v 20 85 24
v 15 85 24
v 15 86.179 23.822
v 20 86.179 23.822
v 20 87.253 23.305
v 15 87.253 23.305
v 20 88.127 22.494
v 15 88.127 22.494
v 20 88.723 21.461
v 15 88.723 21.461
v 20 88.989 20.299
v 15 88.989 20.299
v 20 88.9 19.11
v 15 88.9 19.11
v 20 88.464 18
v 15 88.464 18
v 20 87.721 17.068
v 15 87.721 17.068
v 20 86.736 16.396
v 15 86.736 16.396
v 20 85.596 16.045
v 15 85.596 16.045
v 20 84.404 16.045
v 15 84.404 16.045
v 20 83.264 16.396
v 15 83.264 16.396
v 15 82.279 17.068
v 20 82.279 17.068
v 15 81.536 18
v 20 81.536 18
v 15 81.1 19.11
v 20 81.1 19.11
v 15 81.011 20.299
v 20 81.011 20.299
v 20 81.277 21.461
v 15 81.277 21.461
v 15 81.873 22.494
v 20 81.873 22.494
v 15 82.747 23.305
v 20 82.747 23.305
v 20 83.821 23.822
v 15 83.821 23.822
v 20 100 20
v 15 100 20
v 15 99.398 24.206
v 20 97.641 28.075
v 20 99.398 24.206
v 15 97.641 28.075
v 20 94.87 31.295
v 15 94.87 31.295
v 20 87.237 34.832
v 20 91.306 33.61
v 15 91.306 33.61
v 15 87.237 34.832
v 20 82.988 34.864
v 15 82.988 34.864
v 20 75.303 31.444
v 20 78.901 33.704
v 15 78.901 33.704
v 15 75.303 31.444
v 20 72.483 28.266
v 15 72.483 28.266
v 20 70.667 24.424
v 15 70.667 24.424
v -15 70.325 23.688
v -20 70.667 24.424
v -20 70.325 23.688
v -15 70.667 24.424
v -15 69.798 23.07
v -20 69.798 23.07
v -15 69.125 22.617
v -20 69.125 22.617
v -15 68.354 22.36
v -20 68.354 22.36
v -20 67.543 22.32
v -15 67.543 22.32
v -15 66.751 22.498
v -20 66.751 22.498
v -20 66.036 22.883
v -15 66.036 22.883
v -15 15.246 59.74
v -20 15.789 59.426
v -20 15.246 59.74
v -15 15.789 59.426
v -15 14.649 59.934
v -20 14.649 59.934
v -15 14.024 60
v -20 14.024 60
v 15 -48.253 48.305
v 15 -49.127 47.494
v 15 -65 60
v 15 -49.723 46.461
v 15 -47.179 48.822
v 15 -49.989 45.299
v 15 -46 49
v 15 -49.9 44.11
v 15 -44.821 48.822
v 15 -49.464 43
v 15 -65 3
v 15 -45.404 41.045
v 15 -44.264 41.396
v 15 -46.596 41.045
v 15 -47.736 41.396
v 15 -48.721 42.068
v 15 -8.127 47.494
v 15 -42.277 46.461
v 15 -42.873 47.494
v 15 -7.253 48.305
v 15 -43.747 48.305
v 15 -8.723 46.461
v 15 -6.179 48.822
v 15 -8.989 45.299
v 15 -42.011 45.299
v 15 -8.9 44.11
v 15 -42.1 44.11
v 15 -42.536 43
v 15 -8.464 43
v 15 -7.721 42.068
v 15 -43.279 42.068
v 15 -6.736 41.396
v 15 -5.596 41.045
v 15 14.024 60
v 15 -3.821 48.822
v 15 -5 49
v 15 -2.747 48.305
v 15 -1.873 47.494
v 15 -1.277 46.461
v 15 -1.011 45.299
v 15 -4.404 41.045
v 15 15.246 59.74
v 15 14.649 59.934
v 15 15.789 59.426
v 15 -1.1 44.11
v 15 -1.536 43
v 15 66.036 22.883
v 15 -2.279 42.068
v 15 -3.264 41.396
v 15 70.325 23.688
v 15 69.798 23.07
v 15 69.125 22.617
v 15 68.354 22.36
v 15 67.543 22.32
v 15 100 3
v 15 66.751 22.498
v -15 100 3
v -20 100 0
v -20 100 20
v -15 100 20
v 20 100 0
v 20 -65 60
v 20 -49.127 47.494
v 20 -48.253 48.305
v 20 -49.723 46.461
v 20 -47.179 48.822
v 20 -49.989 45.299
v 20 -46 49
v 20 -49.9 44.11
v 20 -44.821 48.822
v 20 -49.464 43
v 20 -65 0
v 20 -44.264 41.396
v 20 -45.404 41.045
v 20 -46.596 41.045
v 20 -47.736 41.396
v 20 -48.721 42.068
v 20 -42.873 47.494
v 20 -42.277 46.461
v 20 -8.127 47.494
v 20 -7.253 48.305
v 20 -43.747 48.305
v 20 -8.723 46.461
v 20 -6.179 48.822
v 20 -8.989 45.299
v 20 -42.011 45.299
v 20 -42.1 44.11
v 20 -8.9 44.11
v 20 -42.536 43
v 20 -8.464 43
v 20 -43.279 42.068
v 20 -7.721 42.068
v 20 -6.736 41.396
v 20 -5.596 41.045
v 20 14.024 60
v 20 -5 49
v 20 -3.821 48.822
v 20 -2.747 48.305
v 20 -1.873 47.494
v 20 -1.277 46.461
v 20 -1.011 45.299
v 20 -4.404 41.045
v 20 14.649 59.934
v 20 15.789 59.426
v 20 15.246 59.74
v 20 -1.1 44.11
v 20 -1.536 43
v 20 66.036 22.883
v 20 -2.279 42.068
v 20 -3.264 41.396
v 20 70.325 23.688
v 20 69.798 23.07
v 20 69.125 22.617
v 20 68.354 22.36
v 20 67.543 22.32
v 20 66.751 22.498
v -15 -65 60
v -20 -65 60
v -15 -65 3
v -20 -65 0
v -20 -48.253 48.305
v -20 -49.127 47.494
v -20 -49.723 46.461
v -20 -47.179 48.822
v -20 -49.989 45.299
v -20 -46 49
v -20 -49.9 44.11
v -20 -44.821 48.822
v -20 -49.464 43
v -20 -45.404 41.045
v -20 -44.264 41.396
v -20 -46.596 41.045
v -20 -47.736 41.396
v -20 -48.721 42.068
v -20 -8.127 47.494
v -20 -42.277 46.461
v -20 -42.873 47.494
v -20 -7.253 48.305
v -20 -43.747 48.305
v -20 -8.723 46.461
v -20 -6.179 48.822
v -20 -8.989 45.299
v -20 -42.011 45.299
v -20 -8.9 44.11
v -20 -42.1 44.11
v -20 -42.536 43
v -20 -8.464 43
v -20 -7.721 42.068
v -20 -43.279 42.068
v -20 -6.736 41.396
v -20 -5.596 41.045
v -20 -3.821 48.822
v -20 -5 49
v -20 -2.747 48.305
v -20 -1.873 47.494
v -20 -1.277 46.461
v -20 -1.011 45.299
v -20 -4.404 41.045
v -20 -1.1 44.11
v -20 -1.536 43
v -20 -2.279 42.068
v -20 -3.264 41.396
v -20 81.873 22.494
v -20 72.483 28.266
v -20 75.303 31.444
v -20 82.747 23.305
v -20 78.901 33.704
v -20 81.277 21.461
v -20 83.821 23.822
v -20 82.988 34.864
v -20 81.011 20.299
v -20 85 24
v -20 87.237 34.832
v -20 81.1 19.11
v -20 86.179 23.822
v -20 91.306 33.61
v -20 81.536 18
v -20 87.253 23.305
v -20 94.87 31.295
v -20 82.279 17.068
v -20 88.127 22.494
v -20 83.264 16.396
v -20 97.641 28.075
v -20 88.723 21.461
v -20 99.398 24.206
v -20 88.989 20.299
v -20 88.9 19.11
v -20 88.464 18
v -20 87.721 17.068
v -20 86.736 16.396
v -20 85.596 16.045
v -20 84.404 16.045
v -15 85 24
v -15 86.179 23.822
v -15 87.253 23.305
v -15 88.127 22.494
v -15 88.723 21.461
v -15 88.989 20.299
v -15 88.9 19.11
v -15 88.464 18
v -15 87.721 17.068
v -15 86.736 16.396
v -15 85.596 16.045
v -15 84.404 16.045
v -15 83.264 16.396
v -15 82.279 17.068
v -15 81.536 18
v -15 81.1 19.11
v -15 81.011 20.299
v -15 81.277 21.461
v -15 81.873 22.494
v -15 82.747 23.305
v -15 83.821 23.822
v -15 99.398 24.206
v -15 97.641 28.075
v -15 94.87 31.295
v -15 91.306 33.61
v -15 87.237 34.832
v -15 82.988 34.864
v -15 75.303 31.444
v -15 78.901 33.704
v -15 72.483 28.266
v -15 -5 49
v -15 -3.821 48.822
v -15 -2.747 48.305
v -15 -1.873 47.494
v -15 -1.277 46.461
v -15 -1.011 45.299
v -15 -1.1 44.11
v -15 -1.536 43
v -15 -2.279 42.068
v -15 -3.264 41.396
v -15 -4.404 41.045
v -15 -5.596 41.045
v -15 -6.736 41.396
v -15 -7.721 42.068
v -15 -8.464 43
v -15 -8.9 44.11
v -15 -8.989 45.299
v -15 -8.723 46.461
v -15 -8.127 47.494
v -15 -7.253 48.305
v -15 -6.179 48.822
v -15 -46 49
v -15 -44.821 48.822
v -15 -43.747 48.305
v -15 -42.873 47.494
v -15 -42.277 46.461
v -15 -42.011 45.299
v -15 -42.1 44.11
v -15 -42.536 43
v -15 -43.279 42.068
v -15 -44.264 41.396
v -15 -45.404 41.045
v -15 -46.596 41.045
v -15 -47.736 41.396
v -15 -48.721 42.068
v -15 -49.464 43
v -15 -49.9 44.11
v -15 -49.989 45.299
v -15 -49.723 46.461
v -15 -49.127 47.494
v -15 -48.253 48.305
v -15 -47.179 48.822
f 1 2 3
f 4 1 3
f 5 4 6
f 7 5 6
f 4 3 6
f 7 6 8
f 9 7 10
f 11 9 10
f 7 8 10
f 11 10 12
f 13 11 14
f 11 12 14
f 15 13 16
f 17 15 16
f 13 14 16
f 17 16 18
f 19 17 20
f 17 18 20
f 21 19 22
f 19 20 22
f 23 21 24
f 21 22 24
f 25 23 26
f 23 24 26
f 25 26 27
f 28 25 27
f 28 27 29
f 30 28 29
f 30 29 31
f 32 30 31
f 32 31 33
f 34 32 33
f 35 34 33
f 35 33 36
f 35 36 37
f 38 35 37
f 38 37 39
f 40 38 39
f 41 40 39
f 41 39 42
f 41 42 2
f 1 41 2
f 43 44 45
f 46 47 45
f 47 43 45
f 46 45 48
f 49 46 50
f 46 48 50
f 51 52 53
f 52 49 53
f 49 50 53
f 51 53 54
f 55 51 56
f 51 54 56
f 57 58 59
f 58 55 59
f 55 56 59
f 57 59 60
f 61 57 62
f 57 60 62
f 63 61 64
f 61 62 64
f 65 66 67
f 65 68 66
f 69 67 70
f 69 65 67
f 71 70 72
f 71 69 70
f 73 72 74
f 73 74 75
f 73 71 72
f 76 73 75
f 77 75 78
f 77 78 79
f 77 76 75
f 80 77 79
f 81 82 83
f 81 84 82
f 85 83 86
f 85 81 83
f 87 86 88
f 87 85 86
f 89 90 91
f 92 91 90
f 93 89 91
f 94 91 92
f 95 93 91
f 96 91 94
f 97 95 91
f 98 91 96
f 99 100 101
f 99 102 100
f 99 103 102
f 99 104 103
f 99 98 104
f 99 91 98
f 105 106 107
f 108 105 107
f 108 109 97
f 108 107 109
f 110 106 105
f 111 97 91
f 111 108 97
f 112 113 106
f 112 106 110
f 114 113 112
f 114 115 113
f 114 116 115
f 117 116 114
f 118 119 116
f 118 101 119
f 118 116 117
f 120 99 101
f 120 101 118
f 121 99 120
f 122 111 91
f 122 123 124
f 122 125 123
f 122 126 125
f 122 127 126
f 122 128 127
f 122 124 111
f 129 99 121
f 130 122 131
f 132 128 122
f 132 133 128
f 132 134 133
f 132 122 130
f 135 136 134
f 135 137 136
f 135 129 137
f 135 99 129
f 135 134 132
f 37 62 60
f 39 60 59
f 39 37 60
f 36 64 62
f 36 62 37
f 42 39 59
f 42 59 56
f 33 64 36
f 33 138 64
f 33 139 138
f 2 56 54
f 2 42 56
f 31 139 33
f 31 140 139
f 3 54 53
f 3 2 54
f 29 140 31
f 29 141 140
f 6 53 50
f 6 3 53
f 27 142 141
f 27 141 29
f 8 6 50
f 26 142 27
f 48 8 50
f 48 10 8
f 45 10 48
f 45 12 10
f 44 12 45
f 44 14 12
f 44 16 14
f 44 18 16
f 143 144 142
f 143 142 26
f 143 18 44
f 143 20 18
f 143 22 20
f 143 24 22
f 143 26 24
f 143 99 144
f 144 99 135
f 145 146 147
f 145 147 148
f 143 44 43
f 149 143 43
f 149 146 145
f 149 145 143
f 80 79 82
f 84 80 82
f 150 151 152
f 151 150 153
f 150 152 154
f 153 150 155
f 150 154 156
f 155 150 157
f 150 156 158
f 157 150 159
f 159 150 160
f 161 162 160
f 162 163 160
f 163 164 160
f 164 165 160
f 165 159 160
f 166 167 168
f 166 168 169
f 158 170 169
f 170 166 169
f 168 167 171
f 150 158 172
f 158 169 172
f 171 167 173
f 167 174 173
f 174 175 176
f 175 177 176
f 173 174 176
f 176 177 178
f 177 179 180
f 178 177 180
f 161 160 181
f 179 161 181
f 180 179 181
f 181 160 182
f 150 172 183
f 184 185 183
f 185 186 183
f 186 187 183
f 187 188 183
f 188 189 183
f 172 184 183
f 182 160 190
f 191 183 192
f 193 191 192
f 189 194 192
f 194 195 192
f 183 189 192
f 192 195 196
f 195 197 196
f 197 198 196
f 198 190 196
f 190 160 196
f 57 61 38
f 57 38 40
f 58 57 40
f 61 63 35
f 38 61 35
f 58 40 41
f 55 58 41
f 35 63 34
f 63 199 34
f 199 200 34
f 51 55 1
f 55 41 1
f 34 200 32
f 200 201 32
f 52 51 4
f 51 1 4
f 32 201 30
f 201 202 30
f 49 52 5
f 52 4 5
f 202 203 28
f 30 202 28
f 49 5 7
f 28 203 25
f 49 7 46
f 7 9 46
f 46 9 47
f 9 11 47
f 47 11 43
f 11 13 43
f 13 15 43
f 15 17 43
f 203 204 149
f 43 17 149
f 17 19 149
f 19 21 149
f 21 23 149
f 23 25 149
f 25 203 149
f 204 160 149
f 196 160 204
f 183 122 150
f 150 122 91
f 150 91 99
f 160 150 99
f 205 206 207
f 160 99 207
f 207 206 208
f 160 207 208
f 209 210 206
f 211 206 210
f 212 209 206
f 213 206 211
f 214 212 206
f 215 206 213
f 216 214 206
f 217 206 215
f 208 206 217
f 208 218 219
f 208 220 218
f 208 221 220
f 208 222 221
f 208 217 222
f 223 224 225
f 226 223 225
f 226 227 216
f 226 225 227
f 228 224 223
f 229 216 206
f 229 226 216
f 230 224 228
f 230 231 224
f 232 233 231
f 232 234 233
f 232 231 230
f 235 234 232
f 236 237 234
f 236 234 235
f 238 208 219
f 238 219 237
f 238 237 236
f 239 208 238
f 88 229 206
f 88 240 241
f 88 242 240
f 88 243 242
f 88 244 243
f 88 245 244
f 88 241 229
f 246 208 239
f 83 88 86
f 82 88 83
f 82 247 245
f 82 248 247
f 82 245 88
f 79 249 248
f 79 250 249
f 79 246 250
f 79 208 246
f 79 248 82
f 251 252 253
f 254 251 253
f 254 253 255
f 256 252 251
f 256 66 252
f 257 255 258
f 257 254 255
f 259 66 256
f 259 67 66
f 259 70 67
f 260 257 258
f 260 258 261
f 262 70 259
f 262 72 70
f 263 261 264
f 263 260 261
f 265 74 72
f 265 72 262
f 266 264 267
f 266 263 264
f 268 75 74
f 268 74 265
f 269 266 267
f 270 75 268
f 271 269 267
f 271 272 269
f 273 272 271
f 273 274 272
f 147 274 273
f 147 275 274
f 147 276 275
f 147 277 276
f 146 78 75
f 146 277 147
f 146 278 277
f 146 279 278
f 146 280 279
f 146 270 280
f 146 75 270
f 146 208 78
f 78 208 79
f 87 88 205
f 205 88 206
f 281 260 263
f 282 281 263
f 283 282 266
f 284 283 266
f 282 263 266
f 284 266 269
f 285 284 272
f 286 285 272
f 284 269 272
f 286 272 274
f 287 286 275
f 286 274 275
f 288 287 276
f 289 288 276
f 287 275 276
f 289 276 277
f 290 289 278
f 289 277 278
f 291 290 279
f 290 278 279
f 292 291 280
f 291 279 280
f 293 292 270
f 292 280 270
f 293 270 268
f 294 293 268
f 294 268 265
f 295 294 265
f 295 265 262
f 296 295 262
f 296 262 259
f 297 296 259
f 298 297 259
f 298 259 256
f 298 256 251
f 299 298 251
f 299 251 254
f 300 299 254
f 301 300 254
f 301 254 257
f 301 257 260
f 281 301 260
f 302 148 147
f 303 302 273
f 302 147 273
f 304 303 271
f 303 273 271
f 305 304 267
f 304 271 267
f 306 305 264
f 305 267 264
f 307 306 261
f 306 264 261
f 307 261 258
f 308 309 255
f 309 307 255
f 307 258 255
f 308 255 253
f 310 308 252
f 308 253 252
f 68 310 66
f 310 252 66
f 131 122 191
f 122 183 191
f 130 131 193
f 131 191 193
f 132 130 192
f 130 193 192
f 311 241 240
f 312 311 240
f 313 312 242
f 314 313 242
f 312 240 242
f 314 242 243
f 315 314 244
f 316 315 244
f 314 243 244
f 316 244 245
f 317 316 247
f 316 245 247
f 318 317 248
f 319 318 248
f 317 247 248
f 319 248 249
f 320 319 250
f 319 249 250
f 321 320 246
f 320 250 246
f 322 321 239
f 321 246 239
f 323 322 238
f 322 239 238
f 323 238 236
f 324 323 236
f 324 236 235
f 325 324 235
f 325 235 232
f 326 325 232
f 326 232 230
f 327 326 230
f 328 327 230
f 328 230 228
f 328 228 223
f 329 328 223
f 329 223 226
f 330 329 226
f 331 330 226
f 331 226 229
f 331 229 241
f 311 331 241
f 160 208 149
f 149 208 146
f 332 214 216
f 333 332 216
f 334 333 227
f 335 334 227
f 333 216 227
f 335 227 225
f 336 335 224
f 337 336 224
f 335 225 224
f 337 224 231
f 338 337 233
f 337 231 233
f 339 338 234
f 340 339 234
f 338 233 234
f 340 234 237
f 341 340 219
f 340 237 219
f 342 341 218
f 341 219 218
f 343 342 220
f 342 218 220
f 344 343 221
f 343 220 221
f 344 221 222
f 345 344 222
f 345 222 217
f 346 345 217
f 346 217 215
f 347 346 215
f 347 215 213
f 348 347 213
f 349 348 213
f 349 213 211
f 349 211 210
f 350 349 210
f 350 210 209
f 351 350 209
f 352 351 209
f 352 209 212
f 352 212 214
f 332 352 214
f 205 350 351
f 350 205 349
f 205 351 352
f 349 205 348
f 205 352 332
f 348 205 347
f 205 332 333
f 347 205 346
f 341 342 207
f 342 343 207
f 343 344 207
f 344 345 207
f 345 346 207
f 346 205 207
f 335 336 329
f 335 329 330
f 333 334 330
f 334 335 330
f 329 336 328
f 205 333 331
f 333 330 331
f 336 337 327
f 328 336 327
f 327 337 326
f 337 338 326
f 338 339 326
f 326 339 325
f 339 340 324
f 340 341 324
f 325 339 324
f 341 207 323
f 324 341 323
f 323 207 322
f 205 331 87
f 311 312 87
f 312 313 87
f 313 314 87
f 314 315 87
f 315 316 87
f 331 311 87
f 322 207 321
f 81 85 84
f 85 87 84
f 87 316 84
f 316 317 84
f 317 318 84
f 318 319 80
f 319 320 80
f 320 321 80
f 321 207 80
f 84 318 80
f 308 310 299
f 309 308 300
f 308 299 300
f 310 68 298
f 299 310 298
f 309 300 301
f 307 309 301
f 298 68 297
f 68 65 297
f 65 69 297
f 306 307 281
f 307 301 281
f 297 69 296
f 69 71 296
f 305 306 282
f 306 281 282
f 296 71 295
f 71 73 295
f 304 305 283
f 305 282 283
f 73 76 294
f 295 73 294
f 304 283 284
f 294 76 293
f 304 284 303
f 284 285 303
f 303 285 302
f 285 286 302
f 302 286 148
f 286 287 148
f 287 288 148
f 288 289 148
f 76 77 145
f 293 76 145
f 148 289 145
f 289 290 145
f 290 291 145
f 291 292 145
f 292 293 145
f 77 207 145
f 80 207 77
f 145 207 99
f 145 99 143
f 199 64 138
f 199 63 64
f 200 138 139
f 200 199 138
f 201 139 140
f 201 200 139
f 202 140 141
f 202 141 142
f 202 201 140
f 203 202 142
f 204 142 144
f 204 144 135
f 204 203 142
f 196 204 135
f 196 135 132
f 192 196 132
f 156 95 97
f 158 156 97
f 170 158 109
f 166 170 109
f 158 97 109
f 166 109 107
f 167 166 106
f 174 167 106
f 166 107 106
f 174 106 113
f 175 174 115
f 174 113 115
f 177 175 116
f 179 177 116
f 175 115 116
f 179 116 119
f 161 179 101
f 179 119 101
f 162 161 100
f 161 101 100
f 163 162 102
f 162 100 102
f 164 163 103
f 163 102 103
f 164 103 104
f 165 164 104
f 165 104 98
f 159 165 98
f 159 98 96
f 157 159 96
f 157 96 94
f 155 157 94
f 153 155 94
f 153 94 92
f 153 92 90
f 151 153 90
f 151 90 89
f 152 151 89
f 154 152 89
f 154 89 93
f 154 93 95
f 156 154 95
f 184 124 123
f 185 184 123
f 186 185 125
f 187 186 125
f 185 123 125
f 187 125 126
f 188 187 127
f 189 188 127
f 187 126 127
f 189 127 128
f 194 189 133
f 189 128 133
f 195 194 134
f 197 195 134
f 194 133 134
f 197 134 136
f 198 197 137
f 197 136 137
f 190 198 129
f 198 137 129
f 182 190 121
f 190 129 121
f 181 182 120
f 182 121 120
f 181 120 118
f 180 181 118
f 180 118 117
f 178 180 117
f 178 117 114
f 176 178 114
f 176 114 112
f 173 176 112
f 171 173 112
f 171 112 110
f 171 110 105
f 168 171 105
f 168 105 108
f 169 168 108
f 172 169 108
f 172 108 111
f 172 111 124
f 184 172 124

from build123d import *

# Parameters (mm, degrees)
SKETCH1_W           = 200
SKETCH1_H           = 40
BOSS_EXTRUDE1_DEPTH = 3
SKETCH2_W           = 5
SKETCH2_H           = 200
BOSS_EXTRUDE2_DEPTH = 60
SKETCH4_R           = 4
CUT_EXTRUDE1_DEPTH  = 60
FILLET2_R           = 3


with BuildPart() as part:
    # Sketch1 → Boss-Extrude1 (new body)
    with BuildSketch(Plane(origin=(0, 0, 0), x_dir=(0, 1, 0), z_dir=(0, 0, 1))):
        Rectangle(SKETCH1_W, SKETCH1_H)
    extrude(amount=BOSS_EXTRUDE1_DEPTH)

    # Sketch2 → Boss-Extrude2 (add)
    with BuildSketch(Plane.XY.offset(3)):
        with Locations((-17.5, 0)):
            Rectangle(SKETCH2_W, SKETCH2_H)
        with Locations((17.5, 0)):
            Rectangle(SKETCH2_W, SKETCH2_H)
    extrude(amount=BOSS_EXTRUDE2_DEPTH)

    # Sketch4 → Cut-Extrude1 (cut)
    with BuildSketch(Plane(origin=(-20, 0, 0), x_dir=(0, -1, 0), z_dir=(-1, 0, 0))):
        with BuildLine():
            Line((-100, 63), (-100, 20))
            ThreePointArc((-100, 20), (-85, 35), (-70, 20))
            Line((-70, 20), (-15, 60))
            Line((-15, 60), (65, 60))
            Line((65, 60), (65, 0))
            Line((65, 0), (100, 0))
            Line((100, 0), (100, 63))
            Line((100, 63), (-100, 63))
        make_face()
        with Locations(Location((-85, 20, 0), (0, 0, 90))):
            Circle(SKETCH4_R)
        with Locations(Location((5, 45, 0), (0, 0, 90))):
            Circle(SKETCH4_R)
        with Locations(Location((46, 45, 0), (0, 0, 90))):
            Circle(SKETCH4_R)
    extrude(amount=-CUT_EXTRUDE1_DEPTH, mode=Mode.SUBTRACT)

    # Fillet2
    fillet2_edges = [part.edges().sort_by_distance(p)[0] for p in [
        (17.5, 70, 20),
        (-17.5, 70, 20),
        (17.5, 15, 60),
        (-17.5, 15, 60),
    ]]
    fillet(fillet2_edges, radius=FILLET2_R)


solid = part.part
